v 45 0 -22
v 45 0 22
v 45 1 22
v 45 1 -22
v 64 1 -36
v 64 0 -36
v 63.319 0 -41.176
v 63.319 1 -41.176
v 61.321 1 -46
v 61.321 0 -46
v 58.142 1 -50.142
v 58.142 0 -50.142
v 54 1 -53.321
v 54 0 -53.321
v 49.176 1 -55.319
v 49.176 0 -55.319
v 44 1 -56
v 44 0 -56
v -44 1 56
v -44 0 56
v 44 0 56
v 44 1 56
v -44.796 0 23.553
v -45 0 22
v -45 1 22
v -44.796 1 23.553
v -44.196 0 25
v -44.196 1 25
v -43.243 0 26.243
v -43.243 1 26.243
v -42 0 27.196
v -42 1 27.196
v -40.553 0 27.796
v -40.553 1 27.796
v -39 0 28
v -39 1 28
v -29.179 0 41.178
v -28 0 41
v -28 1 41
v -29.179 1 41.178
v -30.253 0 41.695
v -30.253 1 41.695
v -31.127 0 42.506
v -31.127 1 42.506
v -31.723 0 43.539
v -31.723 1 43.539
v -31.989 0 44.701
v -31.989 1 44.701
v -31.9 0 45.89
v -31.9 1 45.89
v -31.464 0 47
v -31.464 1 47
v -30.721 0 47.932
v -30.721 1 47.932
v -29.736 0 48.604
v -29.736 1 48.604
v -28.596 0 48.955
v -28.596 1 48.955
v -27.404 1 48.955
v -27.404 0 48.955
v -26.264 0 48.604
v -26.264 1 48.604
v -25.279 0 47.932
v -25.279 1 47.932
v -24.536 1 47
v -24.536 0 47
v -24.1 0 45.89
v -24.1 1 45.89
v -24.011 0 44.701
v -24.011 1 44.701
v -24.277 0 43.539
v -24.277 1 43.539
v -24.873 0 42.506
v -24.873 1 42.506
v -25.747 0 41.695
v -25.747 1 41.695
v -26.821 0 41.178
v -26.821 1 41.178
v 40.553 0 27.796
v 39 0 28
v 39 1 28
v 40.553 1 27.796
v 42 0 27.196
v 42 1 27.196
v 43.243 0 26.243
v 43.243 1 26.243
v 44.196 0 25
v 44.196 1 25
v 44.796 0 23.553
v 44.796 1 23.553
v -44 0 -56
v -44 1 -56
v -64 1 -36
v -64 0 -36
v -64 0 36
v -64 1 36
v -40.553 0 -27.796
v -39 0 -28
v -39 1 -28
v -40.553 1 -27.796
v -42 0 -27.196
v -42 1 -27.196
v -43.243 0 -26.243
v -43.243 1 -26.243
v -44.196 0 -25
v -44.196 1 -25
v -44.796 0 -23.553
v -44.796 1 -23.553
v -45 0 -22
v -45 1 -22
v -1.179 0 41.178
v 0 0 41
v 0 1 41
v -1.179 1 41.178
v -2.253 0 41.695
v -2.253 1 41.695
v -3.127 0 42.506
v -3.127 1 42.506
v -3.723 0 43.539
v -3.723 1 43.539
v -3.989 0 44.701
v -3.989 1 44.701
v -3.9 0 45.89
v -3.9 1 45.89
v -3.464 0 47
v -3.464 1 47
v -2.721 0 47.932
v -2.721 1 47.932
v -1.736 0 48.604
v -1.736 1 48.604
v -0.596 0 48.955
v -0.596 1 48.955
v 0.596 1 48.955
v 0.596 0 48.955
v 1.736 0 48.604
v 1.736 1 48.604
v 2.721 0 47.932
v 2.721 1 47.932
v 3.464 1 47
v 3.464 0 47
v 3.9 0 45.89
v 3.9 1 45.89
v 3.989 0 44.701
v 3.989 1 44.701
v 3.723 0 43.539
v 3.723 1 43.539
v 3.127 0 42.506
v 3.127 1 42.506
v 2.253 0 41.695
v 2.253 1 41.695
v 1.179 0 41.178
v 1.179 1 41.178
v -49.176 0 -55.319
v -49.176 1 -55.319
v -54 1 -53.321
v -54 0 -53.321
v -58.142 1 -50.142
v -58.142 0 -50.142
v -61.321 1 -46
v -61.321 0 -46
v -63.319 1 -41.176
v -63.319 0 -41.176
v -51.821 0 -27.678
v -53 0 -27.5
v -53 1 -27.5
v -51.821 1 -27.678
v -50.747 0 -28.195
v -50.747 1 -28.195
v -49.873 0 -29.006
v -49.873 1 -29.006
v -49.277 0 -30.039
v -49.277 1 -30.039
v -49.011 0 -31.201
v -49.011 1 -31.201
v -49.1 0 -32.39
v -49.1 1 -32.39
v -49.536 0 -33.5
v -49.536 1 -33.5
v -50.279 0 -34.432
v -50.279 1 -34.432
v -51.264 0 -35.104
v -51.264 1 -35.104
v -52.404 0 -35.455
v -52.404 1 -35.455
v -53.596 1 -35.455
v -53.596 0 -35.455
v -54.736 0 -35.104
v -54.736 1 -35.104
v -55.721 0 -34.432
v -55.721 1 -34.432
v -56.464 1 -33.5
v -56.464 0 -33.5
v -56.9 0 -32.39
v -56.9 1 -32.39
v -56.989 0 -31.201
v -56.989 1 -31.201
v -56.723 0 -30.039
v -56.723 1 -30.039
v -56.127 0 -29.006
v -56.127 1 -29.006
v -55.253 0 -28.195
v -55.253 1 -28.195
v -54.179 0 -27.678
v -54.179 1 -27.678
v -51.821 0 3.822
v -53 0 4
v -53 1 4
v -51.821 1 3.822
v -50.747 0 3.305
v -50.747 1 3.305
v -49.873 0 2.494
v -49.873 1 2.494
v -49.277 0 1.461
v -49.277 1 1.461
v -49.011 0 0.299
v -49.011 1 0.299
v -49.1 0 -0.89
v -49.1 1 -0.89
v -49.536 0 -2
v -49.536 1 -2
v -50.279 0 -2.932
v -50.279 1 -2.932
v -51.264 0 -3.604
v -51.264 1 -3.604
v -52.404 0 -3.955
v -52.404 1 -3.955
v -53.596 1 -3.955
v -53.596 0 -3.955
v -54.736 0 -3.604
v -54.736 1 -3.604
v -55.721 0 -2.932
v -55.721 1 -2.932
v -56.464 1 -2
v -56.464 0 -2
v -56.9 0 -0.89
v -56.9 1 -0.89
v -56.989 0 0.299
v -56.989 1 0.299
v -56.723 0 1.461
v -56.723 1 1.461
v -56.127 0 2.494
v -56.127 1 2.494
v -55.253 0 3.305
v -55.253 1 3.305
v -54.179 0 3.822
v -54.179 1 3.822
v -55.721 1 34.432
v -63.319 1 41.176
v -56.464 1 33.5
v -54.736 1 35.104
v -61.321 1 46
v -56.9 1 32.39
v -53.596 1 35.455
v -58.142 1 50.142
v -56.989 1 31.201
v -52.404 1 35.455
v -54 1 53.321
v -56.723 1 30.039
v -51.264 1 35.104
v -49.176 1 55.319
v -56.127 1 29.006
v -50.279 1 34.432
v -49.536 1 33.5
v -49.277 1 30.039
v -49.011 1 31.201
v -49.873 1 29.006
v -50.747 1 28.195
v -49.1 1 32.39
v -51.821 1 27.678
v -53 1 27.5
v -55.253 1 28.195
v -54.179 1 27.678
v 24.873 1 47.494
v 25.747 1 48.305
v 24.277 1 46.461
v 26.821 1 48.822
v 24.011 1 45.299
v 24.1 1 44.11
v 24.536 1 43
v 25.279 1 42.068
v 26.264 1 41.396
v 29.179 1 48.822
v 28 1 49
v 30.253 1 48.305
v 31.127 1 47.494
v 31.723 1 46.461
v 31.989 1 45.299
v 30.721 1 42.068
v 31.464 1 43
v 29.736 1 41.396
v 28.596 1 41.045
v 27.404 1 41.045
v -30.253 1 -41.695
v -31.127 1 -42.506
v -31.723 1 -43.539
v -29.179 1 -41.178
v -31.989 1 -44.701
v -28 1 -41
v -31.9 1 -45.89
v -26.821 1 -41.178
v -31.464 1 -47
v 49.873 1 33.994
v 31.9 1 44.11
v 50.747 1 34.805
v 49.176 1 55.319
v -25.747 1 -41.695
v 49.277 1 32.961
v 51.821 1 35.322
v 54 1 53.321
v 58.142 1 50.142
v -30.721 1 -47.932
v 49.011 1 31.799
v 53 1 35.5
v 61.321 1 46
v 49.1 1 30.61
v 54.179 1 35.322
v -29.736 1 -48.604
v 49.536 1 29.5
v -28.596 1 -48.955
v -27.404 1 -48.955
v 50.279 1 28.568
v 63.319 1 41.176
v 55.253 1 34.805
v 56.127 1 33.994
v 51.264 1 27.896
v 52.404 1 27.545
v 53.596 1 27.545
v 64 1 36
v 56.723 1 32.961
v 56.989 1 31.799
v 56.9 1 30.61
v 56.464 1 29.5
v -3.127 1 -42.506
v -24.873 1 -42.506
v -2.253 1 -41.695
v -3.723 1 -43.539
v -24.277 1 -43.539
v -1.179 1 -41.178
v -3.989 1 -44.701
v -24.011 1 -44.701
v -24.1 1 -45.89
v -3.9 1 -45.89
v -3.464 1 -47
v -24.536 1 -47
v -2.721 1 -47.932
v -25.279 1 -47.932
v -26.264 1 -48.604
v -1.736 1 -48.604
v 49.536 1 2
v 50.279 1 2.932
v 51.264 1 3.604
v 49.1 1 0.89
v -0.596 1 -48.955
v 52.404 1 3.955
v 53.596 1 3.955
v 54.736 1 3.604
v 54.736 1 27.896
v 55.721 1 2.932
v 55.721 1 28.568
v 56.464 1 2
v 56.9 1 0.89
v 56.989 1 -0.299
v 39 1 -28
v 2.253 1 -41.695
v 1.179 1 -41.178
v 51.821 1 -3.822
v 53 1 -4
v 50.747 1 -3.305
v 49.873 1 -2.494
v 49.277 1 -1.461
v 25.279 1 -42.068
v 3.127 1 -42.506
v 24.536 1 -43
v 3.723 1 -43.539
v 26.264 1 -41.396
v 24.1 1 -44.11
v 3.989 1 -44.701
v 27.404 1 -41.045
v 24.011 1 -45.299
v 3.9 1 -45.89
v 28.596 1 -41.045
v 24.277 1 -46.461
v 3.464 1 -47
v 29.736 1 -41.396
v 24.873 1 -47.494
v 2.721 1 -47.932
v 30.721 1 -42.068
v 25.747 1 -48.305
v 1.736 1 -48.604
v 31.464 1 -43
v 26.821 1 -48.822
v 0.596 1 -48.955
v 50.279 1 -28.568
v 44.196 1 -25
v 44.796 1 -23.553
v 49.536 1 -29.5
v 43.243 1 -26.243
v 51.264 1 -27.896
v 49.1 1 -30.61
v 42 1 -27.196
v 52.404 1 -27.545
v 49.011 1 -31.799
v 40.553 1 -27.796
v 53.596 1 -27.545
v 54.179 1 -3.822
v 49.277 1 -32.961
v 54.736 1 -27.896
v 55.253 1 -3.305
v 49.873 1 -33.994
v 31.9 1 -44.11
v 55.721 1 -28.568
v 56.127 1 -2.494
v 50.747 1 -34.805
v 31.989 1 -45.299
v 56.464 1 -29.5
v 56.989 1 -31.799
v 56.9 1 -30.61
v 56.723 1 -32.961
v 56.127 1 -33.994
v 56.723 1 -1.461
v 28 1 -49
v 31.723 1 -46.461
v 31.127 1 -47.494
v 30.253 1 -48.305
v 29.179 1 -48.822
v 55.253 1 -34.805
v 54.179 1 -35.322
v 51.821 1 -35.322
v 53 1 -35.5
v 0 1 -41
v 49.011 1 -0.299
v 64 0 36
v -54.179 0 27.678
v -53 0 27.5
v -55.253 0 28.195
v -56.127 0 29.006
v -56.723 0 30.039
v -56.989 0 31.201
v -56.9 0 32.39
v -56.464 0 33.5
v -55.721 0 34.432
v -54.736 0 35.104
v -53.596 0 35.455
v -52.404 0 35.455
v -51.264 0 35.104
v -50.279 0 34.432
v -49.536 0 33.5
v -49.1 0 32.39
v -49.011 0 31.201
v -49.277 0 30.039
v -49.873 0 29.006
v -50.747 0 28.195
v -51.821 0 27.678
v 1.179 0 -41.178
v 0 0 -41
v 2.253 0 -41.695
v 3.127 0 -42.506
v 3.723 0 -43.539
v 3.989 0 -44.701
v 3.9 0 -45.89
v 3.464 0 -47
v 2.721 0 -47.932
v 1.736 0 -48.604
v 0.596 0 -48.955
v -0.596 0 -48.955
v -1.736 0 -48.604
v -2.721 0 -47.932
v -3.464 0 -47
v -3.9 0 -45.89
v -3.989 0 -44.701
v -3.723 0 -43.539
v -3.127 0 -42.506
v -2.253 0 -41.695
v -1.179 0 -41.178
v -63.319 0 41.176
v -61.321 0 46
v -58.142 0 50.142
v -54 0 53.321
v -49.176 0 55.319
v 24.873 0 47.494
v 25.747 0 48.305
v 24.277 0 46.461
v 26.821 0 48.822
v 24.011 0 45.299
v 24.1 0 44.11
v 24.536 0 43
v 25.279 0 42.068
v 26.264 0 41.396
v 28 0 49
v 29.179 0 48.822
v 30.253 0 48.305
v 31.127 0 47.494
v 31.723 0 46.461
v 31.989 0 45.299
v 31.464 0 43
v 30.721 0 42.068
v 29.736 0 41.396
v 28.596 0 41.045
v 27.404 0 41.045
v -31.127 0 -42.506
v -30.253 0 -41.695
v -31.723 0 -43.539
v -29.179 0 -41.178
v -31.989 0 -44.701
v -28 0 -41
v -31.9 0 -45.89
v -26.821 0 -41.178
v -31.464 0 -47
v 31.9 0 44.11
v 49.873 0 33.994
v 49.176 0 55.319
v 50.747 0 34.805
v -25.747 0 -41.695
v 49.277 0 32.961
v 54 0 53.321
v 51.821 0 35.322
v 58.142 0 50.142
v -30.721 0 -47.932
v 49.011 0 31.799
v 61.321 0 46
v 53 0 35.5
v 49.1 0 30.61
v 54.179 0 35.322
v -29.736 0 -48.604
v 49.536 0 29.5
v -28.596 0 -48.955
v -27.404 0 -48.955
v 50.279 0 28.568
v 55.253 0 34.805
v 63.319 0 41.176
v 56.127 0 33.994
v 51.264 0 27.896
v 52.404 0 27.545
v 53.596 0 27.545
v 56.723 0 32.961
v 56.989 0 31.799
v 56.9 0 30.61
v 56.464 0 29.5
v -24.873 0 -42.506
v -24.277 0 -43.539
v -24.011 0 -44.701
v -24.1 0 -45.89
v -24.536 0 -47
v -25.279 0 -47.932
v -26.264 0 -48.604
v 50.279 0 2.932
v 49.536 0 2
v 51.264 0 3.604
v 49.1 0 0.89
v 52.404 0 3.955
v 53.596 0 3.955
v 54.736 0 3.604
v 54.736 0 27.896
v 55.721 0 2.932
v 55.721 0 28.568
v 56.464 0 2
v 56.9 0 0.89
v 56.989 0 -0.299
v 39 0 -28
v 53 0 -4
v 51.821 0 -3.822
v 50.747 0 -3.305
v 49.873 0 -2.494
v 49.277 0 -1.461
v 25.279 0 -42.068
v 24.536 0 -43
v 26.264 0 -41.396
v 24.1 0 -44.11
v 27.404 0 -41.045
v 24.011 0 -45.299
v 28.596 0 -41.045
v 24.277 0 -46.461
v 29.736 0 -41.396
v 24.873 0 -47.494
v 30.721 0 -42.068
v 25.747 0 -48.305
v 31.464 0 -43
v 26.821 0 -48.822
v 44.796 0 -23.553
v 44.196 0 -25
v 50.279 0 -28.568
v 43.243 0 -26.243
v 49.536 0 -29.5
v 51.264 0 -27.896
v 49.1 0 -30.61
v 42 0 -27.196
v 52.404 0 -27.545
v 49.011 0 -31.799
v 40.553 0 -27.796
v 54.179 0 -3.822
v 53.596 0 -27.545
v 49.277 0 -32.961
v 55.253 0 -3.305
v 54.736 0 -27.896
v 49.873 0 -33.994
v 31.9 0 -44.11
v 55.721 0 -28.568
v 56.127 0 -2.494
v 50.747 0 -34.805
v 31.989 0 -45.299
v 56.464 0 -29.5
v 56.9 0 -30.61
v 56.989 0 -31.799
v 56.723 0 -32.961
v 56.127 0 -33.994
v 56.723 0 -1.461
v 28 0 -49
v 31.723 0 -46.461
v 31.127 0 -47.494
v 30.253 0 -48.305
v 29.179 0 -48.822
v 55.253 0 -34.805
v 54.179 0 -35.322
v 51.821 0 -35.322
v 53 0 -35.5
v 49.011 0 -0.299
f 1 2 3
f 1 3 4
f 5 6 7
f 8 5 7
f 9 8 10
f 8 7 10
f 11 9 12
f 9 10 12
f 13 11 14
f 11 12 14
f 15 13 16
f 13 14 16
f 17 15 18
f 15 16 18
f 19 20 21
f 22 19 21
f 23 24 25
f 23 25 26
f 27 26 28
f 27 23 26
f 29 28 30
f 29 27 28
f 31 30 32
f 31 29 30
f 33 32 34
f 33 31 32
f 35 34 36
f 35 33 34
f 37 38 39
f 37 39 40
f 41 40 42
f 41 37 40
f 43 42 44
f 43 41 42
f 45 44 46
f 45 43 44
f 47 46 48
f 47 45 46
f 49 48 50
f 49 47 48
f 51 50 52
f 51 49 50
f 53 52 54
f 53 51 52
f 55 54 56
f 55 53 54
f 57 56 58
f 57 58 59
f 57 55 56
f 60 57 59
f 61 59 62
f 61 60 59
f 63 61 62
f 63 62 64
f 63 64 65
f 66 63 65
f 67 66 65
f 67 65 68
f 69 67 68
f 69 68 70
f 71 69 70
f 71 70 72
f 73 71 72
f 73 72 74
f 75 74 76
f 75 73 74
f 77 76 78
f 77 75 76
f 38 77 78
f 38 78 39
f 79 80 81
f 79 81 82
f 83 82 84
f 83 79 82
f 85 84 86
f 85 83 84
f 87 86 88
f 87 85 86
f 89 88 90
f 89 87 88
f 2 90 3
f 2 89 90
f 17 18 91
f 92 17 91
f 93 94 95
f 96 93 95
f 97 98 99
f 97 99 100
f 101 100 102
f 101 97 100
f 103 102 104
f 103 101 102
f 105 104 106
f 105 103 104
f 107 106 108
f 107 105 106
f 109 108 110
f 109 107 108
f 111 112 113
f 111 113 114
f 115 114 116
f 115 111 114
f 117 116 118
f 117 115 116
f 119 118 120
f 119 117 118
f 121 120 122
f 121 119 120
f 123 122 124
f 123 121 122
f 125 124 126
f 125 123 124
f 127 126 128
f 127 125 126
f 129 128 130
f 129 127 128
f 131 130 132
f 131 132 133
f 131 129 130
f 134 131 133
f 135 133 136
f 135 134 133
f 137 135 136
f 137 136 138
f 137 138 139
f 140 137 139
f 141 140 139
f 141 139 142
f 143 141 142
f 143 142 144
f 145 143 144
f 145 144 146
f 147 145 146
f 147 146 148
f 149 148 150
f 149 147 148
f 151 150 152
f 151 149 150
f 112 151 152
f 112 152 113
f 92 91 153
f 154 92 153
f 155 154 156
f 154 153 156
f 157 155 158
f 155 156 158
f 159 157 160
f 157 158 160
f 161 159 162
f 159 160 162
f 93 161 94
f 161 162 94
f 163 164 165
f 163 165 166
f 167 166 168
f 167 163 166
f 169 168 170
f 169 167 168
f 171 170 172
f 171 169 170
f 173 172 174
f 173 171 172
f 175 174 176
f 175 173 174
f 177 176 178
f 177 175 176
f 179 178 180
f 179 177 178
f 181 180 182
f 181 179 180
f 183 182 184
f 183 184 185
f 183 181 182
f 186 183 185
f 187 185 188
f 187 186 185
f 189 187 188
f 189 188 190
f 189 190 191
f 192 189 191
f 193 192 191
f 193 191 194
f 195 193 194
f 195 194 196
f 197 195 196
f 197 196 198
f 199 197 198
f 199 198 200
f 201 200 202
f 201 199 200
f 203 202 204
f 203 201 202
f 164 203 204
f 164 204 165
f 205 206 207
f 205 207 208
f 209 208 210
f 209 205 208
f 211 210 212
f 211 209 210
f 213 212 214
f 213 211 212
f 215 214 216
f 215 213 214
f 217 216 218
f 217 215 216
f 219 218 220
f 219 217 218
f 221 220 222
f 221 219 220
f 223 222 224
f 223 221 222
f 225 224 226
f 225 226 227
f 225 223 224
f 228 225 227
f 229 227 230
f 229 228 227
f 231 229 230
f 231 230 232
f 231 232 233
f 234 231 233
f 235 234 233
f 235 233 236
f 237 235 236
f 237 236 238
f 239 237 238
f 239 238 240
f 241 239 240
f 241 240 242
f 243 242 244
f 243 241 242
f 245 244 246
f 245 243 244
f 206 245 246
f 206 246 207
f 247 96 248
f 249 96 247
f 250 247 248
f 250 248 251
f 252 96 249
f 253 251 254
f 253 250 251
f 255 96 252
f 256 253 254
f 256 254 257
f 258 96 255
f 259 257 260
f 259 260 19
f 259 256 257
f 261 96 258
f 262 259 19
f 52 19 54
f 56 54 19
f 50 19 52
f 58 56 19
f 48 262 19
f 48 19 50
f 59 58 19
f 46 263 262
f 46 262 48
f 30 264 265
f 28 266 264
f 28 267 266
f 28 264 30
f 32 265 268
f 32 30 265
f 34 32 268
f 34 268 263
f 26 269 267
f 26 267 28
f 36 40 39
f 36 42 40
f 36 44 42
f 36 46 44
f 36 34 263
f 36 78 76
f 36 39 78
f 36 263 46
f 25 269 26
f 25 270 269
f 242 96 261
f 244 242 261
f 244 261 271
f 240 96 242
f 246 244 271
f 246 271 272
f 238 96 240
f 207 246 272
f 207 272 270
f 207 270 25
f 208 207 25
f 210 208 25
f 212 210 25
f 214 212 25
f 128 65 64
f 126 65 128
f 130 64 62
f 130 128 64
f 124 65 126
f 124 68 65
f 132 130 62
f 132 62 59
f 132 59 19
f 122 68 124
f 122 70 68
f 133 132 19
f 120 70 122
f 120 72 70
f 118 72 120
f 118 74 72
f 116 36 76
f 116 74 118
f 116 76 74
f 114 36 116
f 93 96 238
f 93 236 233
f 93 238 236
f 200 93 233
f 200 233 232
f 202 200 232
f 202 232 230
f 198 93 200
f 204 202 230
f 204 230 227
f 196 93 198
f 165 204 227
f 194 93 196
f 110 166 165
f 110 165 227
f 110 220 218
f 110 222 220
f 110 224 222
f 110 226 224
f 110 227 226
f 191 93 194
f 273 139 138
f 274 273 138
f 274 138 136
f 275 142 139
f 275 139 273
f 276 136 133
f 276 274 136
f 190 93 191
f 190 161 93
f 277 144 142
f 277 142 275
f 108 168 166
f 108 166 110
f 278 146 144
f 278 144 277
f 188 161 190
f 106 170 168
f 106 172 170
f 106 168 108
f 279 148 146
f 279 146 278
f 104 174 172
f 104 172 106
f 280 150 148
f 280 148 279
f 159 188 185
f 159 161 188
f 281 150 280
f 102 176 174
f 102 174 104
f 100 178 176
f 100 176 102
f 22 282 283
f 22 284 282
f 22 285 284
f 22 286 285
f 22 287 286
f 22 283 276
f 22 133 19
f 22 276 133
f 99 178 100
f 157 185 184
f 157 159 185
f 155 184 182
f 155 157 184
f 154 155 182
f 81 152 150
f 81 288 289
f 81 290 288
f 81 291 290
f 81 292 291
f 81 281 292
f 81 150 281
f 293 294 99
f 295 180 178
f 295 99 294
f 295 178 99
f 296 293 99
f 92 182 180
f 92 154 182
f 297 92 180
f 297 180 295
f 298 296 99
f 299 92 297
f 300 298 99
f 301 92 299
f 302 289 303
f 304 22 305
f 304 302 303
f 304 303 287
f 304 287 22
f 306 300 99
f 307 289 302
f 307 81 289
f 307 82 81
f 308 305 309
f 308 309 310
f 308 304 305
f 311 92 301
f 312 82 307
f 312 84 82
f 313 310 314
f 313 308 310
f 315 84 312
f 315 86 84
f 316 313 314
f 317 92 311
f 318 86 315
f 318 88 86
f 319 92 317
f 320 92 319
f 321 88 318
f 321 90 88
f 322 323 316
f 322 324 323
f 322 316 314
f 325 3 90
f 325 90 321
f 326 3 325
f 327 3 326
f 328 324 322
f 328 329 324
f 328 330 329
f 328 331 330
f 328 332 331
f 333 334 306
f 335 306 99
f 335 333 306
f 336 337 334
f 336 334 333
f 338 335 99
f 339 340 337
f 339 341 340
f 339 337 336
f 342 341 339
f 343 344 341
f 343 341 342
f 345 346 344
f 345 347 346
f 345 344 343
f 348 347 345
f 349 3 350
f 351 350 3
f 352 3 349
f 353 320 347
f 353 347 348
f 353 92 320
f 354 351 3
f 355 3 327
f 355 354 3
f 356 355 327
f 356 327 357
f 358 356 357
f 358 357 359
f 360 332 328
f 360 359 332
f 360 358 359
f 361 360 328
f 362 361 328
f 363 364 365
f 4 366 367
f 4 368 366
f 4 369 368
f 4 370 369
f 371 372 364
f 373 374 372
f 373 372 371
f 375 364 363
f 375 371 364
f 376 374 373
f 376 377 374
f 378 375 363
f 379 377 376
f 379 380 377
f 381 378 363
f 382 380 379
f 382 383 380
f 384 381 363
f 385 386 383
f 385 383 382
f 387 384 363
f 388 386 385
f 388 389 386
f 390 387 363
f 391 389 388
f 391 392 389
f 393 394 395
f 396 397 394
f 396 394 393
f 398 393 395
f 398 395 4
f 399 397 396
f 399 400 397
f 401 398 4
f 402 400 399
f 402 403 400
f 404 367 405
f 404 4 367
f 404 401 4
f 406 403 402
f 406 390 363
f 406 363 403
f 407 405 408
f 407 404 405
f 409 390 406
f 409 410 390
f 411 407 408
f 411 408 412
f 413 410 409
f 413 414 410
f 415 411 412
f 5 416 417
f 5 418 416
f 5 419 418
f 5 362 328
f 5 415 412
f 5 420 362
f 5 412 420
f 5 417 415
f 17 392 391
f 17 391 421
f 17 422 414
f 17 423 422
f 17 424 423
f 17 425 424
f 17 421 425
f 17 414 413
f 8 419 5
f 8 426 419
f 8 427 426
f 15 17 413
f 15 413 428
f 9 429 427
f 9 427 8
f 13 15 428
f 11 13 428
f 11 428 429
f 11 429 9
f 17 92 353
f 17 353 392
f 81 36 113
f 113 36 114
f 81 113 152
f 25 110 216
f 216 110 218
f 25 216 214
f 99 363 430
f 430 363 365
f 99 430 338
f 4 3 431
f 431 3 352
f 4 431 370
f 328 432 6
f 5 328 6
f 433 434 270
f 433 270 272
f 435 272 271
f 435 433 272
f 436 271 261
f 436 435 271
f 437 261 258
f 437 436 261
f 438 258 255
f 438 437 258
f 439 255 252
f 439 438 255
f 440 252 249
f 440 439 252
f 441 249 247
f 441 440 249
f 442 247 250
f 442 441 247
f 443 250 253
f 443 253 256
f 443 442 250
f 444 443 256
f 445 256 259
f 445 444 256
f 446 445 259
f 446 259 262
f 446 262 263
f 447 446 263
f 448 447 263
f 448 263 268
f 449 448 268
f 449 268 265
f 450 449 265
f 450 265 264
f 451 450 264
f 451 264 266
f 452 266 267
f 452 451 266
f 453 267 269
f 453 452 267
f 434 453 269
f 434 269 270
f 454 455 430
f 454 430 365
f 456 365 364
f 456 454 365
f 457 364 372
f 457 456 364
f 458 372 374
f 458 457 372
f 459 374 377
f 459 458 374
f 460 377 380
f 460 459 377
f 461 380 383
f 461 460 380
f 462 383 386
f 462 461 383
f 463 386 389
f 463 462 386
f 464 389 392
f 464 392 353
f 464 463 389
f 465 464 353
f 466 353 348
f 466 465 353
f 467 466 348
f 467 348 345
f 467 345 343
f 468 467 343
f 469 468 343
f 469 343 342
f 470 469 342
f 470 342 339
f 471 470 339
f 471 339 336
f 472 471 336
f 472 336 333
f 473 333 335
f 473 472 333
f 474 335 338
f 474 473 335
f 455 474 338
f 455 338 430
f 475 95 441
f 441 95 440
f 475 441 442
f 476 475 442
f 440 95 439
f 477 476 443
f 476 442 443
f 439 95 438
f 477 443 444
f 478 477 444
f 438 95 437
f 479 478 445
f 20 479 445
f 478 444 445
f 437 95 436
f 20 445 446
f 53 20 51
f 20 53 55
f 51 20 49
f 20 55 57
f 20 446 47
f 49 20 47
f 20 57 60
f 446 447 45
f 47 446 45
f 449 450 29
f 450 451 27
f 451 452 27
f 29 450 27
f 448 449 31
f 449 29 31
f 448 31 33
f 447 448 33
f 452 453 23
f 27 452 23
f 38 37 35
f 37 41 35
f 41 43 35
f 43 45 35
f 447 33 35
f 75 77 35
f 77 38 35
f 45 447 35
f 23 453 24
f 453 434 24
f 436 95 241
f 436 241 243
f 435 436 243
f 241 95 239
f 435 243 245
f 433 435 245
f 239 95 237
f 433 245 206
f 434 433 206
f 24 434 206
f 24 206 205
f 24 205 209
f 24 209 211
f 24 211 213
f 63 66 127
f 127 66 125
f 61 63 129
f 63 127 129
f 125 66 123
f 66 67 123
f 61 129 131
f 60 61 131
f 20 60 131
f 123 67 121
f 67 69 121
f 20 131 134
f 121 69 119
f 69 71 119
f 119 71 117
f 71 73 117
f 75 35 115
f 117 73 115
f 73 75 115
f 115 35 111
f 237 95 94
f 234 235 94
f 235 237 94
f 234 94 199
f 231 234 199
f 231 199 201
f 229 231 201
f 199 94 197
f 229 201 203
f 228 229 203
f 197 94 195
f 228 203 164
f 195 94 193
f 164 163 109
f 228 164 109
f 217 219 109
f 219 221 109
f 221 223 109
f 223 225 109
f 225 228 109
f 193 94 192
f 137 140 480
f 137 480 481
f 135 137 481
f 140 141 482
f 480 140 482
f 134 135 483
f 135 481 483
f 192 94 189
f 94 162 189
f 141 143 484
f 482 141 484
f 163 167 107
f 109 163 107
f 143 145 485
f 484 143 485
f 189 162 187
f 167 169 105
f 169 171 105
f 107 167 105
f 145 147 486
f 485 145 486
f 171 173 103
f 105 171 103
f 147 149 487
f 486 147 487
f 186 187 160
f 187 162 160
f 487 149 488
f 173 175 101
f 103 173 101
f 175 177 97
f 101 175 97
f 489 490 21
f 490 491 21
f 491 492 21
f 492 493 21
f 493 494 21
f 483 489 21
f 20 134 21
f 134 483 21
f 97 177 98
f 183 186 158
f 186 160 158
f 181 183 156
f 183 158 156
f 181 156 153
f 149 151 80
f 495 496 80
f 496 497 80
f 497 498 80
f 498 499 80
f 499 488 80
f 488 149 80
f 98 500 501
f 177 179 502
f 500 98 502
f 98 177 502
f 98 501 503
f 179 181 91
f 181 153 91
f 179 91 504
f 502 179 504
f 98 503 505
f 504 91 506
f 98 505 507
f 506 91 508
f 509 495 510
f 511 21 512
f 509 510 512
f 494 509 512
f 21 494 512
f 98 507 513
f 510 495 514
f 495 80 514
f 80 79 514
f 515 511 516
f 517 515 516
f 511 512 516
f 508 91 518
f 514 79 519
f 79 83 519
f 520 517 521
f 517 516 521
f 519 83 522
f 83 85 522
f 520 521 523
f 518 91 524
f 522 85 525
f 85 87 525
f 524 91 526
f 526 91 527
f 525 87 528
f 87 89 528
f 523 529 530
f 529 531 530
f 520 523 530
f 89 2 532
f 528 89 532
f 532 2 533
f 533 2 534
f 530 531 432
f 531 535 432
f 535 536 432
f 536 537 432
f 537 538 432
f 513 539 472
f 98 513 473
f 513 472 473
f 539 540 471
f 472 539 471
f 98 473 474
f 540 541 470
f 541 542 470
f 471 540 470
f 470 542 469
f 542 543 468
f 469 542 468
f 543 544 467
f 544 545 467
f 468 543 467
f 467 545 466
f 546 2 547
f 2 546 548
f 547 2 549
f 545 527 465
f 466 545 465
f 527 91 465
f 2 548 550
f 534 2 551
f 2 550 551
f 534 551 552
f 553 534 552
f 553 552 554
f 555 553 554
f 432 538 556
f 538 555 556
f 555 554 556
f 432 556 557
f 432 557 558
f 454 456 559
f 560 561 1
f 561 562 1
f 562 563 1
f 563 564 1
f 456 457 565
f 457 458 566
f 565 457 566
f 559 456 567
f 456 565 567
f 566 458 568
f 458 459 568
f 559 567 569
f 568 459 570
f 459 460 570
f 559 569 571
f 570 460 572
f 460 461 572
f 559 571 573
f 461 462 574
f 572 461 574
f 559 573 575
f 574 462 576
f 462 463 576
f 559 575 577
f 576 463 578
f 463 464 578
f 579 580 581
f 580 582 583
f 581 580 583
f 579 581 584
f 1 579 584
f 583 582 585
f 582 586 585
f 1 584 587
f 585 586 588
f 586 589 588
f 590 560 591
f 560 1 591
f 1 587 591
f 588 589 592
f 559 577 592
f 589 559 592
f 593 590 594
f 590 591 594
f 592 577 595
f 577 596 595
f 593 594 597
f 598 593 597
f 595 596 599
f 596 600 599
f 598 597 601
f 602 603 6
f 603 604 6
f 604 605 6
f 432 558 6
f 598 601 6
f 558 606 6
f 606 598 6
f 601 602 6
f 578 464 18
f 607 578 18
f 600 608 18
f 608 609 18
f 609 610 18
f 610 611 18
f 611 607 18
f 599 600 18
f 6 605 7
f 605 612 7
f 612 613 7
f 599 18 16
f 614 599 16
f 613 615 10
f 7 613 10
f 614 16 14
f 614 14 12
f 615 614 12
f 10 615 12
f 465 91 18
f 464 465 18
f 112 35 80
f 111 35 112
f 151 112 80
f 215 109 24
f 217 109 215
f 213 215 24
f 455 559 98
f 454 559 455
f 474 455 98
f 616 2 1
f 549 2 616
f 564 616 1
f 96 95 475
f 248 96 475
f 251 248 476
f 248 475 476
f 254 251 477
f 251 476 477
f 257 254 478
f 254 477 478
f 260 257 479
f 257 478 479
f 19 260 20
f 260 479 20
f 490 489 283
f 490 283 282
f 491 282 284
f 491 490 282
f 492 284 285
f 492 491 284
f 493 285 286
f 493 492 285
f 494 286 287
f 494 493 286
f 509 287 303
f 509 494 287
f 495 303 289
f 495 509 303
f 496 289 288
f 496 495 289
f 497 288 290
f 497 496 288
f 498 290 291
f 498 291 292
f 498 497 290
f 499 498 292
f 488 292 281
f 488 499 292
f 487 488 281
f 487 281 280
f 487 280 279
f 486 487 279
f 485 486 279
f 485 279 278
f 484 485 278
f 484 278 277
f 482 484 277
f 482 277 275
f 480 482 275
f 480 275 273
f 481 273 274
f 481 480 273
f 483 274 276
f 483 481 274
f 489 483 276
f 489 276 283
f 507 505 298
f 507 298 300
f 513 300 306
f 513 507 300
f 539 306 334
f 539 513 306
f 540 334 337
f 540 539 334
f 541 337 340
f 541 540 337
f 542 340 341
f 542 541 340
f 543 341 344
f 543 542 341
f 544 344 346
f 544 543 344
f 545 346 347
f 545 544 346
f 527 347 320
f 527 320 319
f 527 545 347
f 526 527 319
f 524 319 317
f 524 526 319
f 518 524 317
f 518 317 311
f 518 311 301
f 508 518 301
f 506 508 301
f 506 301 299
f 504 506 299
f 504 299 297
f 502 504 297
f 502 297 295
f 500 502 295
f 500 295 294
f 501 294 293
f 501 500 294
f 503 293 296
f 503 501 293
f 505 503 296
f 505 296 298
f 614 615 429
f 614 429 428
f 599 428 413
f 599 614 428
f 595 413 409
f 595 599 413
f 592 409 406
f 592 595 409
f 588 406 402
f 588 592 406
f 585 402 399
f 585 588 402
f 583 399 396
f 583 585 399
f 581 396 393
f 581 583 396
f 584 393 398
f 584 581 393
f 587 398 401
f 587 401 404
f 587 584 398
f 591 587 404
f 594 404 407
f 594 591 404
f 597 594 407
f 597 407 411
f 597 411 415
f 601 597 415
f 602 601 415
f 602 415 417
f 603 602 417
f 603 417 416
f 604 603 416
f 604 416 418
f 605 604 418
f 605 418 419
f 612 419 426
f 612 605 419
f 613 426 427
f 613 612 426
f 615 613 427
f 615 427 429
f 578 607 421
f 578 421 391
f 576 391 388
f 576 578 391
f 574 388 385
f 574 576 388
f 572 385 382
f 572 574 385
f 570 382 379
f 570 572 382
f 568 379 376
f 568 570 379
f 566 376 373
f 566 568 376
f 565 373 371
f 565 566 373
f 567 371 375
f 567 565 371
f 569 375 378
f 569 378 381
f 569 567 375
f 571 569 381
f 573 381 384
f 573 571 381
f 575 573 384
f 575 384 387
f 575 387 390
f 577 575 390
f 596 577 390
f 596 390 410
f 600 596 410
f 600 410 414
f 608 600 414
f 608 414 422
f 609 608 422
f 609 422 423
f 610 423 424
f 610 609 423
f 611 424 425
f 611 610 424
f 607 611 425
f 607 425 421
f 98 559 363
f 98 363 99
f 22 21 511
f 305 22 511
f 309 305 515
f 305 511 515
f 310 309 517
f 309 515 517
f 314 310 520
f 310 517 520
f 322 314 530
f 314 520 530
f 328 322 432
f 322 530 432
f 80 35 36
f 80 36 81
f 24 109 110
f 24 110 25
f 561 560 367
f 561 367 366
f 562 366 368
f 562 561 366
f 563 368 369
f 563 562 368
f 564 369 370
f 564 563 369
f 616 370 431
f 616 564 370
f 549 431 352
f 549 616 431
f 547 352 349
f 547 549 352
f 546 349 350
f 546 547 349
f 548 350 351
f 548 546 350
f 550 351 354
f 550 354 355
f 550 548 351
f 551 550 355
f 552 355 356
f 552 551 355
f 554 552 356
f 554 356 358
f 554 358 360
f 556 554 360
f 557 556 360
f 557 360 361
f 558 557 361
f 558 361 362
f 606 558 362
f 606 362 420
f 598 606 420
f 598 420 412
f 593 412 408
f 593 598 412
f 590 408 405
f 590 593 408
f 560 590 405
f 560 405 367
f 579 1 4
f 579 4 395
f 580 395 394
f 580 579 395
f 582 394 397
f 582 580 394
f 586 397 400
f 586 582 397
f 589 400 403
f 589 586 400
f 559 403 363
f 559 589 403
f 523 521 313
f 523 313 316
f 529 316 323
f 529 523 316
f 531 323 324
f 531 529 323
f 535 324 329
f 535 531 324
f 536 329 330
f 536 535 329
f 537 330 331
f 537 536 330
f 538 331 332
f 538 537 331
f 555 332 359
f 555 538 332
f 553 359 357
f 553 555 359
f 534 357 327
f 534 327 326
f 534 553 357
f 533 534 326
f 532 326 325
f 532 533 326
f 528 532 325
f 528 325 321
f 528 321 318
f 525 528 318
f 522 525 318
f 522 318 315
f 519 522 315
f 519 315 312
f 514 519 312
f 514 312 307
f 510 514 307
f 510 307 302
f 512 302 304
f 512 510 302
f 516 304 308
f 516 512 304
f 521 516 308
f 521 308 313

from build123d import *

# Parameters (mm, degrees)
SKETCH_1_R      = 4
EXTRUDE_1_DEPTH = 1


with BuildPart() as part:
    # 草图1 → 凸台-拉伸1 (new body)
    with BuildSketch(Plane(origin=(0, 0, 0), x_dir=(1, 0, 0), z_dir=(0, 1, 0))):
        with BuildLine():
            Line((-44, -56), (44, -56))
            ThreePointArc((44, -56), (58.142135624, -50.142135624), (64, -36))
            Line((64, -36), (64, 36))
            ThreePointArc((64, 36), (58.142135624, 50.142135624), (44, 56))
            Line((44, 56), (-44, 56))
            ThreePointArc((-44, 56), (-58.142135624, 50.142135624), (-64, 36))
            Line((-64, 36), (-64, -36))
            ThreePointArc((-64, -36), (-58.142135624, -50.142135624), (-44, -56))
        make_face()
        with Locations(Location((-28, 45, 0), (0, 0, 270))):
            Circle(SKETCH_1_R, mode=Mode.SUBTRACT)
        with Locations(Location((0, 45, 0), (0, 0, 270))):
            Circle(SKETCH_1_R, mode=Mode.SUBTRACT)
        with Locations(Location((28, 45, 0), (0, 0, 90))):
            Circle(SKETCH_1_R, mode=Mode.SUBTRACT)
        with Locations(Location((-53, 31.5, 0), (0, 0, 270))):
            Circle(SKETCH_1_R, mode=Mode.SUBTRACT)
        with Locations(Location((-53, 0, 0), (0, 0, 270))):
            Circle(SKETCH_1_R, mode=Mode.SUBTRACT)
        with Locations(Location((-53, -31.5, 0), (0, 0, 90))):
            Circle(SKETCH_1_R, mode=Mode.SUBTRACT)
        with Locations(Location((53, 31.5, 0), (0, 0, 90))):
            Circle(SKETCH_1_R, mode=Mode.SUBTRACT)
        with Locations(Location((53, 0, 0), (0, 0, 90))):
            Circle(SKETCH_1_R, mode=Mode.SUBTRACT)
        with Locations(Location((53, -31.5, 0), (0, 0, 270))):
            Circle(SKETCH_1_R, mode=Mode.SUBTRACT)
        with Locations(Location((28, -45, 0), (0, 0, 270))):
            Circle(SKETCH_1_R, mode=Mode.SUBTRACT)
        with Locations(Location((0, -45, 0), (0, 0, 90))):
            Circle(SKETCH_1_R, mode=Mode.SUBTRACT)
        with Locations(Location((-28, -45, 0), (0, 0, 90))):
            Circle(SKETCH_1_R, mode=Mode.SUBTRACT)
        with BuildLine():
            Line((-39, -28), (39, -28))
            ThreePointArc((39, -28), (43.242640687, -26.242640687), (45, -22))
            Line((45, -22), (45, 22))
            ThreePointArc((45, 22), (43.242640687, 26.242640687), (39, 28))
            Line((39, 28), (-39, 28))
            ThreePointArc((-39, 28), (-43.242640687, 26.242640687), (-45, 22))
            Line((-45, 22), (-45, -22))
            ThreePointArc((-45, -22), (-43.242640687, -26.242640687), (-39, -28))
        make_face(mode=Mode.SUBTRACT)
    extrude(amount=EXTRUDE_1_DEPTH)


solid = part.part
